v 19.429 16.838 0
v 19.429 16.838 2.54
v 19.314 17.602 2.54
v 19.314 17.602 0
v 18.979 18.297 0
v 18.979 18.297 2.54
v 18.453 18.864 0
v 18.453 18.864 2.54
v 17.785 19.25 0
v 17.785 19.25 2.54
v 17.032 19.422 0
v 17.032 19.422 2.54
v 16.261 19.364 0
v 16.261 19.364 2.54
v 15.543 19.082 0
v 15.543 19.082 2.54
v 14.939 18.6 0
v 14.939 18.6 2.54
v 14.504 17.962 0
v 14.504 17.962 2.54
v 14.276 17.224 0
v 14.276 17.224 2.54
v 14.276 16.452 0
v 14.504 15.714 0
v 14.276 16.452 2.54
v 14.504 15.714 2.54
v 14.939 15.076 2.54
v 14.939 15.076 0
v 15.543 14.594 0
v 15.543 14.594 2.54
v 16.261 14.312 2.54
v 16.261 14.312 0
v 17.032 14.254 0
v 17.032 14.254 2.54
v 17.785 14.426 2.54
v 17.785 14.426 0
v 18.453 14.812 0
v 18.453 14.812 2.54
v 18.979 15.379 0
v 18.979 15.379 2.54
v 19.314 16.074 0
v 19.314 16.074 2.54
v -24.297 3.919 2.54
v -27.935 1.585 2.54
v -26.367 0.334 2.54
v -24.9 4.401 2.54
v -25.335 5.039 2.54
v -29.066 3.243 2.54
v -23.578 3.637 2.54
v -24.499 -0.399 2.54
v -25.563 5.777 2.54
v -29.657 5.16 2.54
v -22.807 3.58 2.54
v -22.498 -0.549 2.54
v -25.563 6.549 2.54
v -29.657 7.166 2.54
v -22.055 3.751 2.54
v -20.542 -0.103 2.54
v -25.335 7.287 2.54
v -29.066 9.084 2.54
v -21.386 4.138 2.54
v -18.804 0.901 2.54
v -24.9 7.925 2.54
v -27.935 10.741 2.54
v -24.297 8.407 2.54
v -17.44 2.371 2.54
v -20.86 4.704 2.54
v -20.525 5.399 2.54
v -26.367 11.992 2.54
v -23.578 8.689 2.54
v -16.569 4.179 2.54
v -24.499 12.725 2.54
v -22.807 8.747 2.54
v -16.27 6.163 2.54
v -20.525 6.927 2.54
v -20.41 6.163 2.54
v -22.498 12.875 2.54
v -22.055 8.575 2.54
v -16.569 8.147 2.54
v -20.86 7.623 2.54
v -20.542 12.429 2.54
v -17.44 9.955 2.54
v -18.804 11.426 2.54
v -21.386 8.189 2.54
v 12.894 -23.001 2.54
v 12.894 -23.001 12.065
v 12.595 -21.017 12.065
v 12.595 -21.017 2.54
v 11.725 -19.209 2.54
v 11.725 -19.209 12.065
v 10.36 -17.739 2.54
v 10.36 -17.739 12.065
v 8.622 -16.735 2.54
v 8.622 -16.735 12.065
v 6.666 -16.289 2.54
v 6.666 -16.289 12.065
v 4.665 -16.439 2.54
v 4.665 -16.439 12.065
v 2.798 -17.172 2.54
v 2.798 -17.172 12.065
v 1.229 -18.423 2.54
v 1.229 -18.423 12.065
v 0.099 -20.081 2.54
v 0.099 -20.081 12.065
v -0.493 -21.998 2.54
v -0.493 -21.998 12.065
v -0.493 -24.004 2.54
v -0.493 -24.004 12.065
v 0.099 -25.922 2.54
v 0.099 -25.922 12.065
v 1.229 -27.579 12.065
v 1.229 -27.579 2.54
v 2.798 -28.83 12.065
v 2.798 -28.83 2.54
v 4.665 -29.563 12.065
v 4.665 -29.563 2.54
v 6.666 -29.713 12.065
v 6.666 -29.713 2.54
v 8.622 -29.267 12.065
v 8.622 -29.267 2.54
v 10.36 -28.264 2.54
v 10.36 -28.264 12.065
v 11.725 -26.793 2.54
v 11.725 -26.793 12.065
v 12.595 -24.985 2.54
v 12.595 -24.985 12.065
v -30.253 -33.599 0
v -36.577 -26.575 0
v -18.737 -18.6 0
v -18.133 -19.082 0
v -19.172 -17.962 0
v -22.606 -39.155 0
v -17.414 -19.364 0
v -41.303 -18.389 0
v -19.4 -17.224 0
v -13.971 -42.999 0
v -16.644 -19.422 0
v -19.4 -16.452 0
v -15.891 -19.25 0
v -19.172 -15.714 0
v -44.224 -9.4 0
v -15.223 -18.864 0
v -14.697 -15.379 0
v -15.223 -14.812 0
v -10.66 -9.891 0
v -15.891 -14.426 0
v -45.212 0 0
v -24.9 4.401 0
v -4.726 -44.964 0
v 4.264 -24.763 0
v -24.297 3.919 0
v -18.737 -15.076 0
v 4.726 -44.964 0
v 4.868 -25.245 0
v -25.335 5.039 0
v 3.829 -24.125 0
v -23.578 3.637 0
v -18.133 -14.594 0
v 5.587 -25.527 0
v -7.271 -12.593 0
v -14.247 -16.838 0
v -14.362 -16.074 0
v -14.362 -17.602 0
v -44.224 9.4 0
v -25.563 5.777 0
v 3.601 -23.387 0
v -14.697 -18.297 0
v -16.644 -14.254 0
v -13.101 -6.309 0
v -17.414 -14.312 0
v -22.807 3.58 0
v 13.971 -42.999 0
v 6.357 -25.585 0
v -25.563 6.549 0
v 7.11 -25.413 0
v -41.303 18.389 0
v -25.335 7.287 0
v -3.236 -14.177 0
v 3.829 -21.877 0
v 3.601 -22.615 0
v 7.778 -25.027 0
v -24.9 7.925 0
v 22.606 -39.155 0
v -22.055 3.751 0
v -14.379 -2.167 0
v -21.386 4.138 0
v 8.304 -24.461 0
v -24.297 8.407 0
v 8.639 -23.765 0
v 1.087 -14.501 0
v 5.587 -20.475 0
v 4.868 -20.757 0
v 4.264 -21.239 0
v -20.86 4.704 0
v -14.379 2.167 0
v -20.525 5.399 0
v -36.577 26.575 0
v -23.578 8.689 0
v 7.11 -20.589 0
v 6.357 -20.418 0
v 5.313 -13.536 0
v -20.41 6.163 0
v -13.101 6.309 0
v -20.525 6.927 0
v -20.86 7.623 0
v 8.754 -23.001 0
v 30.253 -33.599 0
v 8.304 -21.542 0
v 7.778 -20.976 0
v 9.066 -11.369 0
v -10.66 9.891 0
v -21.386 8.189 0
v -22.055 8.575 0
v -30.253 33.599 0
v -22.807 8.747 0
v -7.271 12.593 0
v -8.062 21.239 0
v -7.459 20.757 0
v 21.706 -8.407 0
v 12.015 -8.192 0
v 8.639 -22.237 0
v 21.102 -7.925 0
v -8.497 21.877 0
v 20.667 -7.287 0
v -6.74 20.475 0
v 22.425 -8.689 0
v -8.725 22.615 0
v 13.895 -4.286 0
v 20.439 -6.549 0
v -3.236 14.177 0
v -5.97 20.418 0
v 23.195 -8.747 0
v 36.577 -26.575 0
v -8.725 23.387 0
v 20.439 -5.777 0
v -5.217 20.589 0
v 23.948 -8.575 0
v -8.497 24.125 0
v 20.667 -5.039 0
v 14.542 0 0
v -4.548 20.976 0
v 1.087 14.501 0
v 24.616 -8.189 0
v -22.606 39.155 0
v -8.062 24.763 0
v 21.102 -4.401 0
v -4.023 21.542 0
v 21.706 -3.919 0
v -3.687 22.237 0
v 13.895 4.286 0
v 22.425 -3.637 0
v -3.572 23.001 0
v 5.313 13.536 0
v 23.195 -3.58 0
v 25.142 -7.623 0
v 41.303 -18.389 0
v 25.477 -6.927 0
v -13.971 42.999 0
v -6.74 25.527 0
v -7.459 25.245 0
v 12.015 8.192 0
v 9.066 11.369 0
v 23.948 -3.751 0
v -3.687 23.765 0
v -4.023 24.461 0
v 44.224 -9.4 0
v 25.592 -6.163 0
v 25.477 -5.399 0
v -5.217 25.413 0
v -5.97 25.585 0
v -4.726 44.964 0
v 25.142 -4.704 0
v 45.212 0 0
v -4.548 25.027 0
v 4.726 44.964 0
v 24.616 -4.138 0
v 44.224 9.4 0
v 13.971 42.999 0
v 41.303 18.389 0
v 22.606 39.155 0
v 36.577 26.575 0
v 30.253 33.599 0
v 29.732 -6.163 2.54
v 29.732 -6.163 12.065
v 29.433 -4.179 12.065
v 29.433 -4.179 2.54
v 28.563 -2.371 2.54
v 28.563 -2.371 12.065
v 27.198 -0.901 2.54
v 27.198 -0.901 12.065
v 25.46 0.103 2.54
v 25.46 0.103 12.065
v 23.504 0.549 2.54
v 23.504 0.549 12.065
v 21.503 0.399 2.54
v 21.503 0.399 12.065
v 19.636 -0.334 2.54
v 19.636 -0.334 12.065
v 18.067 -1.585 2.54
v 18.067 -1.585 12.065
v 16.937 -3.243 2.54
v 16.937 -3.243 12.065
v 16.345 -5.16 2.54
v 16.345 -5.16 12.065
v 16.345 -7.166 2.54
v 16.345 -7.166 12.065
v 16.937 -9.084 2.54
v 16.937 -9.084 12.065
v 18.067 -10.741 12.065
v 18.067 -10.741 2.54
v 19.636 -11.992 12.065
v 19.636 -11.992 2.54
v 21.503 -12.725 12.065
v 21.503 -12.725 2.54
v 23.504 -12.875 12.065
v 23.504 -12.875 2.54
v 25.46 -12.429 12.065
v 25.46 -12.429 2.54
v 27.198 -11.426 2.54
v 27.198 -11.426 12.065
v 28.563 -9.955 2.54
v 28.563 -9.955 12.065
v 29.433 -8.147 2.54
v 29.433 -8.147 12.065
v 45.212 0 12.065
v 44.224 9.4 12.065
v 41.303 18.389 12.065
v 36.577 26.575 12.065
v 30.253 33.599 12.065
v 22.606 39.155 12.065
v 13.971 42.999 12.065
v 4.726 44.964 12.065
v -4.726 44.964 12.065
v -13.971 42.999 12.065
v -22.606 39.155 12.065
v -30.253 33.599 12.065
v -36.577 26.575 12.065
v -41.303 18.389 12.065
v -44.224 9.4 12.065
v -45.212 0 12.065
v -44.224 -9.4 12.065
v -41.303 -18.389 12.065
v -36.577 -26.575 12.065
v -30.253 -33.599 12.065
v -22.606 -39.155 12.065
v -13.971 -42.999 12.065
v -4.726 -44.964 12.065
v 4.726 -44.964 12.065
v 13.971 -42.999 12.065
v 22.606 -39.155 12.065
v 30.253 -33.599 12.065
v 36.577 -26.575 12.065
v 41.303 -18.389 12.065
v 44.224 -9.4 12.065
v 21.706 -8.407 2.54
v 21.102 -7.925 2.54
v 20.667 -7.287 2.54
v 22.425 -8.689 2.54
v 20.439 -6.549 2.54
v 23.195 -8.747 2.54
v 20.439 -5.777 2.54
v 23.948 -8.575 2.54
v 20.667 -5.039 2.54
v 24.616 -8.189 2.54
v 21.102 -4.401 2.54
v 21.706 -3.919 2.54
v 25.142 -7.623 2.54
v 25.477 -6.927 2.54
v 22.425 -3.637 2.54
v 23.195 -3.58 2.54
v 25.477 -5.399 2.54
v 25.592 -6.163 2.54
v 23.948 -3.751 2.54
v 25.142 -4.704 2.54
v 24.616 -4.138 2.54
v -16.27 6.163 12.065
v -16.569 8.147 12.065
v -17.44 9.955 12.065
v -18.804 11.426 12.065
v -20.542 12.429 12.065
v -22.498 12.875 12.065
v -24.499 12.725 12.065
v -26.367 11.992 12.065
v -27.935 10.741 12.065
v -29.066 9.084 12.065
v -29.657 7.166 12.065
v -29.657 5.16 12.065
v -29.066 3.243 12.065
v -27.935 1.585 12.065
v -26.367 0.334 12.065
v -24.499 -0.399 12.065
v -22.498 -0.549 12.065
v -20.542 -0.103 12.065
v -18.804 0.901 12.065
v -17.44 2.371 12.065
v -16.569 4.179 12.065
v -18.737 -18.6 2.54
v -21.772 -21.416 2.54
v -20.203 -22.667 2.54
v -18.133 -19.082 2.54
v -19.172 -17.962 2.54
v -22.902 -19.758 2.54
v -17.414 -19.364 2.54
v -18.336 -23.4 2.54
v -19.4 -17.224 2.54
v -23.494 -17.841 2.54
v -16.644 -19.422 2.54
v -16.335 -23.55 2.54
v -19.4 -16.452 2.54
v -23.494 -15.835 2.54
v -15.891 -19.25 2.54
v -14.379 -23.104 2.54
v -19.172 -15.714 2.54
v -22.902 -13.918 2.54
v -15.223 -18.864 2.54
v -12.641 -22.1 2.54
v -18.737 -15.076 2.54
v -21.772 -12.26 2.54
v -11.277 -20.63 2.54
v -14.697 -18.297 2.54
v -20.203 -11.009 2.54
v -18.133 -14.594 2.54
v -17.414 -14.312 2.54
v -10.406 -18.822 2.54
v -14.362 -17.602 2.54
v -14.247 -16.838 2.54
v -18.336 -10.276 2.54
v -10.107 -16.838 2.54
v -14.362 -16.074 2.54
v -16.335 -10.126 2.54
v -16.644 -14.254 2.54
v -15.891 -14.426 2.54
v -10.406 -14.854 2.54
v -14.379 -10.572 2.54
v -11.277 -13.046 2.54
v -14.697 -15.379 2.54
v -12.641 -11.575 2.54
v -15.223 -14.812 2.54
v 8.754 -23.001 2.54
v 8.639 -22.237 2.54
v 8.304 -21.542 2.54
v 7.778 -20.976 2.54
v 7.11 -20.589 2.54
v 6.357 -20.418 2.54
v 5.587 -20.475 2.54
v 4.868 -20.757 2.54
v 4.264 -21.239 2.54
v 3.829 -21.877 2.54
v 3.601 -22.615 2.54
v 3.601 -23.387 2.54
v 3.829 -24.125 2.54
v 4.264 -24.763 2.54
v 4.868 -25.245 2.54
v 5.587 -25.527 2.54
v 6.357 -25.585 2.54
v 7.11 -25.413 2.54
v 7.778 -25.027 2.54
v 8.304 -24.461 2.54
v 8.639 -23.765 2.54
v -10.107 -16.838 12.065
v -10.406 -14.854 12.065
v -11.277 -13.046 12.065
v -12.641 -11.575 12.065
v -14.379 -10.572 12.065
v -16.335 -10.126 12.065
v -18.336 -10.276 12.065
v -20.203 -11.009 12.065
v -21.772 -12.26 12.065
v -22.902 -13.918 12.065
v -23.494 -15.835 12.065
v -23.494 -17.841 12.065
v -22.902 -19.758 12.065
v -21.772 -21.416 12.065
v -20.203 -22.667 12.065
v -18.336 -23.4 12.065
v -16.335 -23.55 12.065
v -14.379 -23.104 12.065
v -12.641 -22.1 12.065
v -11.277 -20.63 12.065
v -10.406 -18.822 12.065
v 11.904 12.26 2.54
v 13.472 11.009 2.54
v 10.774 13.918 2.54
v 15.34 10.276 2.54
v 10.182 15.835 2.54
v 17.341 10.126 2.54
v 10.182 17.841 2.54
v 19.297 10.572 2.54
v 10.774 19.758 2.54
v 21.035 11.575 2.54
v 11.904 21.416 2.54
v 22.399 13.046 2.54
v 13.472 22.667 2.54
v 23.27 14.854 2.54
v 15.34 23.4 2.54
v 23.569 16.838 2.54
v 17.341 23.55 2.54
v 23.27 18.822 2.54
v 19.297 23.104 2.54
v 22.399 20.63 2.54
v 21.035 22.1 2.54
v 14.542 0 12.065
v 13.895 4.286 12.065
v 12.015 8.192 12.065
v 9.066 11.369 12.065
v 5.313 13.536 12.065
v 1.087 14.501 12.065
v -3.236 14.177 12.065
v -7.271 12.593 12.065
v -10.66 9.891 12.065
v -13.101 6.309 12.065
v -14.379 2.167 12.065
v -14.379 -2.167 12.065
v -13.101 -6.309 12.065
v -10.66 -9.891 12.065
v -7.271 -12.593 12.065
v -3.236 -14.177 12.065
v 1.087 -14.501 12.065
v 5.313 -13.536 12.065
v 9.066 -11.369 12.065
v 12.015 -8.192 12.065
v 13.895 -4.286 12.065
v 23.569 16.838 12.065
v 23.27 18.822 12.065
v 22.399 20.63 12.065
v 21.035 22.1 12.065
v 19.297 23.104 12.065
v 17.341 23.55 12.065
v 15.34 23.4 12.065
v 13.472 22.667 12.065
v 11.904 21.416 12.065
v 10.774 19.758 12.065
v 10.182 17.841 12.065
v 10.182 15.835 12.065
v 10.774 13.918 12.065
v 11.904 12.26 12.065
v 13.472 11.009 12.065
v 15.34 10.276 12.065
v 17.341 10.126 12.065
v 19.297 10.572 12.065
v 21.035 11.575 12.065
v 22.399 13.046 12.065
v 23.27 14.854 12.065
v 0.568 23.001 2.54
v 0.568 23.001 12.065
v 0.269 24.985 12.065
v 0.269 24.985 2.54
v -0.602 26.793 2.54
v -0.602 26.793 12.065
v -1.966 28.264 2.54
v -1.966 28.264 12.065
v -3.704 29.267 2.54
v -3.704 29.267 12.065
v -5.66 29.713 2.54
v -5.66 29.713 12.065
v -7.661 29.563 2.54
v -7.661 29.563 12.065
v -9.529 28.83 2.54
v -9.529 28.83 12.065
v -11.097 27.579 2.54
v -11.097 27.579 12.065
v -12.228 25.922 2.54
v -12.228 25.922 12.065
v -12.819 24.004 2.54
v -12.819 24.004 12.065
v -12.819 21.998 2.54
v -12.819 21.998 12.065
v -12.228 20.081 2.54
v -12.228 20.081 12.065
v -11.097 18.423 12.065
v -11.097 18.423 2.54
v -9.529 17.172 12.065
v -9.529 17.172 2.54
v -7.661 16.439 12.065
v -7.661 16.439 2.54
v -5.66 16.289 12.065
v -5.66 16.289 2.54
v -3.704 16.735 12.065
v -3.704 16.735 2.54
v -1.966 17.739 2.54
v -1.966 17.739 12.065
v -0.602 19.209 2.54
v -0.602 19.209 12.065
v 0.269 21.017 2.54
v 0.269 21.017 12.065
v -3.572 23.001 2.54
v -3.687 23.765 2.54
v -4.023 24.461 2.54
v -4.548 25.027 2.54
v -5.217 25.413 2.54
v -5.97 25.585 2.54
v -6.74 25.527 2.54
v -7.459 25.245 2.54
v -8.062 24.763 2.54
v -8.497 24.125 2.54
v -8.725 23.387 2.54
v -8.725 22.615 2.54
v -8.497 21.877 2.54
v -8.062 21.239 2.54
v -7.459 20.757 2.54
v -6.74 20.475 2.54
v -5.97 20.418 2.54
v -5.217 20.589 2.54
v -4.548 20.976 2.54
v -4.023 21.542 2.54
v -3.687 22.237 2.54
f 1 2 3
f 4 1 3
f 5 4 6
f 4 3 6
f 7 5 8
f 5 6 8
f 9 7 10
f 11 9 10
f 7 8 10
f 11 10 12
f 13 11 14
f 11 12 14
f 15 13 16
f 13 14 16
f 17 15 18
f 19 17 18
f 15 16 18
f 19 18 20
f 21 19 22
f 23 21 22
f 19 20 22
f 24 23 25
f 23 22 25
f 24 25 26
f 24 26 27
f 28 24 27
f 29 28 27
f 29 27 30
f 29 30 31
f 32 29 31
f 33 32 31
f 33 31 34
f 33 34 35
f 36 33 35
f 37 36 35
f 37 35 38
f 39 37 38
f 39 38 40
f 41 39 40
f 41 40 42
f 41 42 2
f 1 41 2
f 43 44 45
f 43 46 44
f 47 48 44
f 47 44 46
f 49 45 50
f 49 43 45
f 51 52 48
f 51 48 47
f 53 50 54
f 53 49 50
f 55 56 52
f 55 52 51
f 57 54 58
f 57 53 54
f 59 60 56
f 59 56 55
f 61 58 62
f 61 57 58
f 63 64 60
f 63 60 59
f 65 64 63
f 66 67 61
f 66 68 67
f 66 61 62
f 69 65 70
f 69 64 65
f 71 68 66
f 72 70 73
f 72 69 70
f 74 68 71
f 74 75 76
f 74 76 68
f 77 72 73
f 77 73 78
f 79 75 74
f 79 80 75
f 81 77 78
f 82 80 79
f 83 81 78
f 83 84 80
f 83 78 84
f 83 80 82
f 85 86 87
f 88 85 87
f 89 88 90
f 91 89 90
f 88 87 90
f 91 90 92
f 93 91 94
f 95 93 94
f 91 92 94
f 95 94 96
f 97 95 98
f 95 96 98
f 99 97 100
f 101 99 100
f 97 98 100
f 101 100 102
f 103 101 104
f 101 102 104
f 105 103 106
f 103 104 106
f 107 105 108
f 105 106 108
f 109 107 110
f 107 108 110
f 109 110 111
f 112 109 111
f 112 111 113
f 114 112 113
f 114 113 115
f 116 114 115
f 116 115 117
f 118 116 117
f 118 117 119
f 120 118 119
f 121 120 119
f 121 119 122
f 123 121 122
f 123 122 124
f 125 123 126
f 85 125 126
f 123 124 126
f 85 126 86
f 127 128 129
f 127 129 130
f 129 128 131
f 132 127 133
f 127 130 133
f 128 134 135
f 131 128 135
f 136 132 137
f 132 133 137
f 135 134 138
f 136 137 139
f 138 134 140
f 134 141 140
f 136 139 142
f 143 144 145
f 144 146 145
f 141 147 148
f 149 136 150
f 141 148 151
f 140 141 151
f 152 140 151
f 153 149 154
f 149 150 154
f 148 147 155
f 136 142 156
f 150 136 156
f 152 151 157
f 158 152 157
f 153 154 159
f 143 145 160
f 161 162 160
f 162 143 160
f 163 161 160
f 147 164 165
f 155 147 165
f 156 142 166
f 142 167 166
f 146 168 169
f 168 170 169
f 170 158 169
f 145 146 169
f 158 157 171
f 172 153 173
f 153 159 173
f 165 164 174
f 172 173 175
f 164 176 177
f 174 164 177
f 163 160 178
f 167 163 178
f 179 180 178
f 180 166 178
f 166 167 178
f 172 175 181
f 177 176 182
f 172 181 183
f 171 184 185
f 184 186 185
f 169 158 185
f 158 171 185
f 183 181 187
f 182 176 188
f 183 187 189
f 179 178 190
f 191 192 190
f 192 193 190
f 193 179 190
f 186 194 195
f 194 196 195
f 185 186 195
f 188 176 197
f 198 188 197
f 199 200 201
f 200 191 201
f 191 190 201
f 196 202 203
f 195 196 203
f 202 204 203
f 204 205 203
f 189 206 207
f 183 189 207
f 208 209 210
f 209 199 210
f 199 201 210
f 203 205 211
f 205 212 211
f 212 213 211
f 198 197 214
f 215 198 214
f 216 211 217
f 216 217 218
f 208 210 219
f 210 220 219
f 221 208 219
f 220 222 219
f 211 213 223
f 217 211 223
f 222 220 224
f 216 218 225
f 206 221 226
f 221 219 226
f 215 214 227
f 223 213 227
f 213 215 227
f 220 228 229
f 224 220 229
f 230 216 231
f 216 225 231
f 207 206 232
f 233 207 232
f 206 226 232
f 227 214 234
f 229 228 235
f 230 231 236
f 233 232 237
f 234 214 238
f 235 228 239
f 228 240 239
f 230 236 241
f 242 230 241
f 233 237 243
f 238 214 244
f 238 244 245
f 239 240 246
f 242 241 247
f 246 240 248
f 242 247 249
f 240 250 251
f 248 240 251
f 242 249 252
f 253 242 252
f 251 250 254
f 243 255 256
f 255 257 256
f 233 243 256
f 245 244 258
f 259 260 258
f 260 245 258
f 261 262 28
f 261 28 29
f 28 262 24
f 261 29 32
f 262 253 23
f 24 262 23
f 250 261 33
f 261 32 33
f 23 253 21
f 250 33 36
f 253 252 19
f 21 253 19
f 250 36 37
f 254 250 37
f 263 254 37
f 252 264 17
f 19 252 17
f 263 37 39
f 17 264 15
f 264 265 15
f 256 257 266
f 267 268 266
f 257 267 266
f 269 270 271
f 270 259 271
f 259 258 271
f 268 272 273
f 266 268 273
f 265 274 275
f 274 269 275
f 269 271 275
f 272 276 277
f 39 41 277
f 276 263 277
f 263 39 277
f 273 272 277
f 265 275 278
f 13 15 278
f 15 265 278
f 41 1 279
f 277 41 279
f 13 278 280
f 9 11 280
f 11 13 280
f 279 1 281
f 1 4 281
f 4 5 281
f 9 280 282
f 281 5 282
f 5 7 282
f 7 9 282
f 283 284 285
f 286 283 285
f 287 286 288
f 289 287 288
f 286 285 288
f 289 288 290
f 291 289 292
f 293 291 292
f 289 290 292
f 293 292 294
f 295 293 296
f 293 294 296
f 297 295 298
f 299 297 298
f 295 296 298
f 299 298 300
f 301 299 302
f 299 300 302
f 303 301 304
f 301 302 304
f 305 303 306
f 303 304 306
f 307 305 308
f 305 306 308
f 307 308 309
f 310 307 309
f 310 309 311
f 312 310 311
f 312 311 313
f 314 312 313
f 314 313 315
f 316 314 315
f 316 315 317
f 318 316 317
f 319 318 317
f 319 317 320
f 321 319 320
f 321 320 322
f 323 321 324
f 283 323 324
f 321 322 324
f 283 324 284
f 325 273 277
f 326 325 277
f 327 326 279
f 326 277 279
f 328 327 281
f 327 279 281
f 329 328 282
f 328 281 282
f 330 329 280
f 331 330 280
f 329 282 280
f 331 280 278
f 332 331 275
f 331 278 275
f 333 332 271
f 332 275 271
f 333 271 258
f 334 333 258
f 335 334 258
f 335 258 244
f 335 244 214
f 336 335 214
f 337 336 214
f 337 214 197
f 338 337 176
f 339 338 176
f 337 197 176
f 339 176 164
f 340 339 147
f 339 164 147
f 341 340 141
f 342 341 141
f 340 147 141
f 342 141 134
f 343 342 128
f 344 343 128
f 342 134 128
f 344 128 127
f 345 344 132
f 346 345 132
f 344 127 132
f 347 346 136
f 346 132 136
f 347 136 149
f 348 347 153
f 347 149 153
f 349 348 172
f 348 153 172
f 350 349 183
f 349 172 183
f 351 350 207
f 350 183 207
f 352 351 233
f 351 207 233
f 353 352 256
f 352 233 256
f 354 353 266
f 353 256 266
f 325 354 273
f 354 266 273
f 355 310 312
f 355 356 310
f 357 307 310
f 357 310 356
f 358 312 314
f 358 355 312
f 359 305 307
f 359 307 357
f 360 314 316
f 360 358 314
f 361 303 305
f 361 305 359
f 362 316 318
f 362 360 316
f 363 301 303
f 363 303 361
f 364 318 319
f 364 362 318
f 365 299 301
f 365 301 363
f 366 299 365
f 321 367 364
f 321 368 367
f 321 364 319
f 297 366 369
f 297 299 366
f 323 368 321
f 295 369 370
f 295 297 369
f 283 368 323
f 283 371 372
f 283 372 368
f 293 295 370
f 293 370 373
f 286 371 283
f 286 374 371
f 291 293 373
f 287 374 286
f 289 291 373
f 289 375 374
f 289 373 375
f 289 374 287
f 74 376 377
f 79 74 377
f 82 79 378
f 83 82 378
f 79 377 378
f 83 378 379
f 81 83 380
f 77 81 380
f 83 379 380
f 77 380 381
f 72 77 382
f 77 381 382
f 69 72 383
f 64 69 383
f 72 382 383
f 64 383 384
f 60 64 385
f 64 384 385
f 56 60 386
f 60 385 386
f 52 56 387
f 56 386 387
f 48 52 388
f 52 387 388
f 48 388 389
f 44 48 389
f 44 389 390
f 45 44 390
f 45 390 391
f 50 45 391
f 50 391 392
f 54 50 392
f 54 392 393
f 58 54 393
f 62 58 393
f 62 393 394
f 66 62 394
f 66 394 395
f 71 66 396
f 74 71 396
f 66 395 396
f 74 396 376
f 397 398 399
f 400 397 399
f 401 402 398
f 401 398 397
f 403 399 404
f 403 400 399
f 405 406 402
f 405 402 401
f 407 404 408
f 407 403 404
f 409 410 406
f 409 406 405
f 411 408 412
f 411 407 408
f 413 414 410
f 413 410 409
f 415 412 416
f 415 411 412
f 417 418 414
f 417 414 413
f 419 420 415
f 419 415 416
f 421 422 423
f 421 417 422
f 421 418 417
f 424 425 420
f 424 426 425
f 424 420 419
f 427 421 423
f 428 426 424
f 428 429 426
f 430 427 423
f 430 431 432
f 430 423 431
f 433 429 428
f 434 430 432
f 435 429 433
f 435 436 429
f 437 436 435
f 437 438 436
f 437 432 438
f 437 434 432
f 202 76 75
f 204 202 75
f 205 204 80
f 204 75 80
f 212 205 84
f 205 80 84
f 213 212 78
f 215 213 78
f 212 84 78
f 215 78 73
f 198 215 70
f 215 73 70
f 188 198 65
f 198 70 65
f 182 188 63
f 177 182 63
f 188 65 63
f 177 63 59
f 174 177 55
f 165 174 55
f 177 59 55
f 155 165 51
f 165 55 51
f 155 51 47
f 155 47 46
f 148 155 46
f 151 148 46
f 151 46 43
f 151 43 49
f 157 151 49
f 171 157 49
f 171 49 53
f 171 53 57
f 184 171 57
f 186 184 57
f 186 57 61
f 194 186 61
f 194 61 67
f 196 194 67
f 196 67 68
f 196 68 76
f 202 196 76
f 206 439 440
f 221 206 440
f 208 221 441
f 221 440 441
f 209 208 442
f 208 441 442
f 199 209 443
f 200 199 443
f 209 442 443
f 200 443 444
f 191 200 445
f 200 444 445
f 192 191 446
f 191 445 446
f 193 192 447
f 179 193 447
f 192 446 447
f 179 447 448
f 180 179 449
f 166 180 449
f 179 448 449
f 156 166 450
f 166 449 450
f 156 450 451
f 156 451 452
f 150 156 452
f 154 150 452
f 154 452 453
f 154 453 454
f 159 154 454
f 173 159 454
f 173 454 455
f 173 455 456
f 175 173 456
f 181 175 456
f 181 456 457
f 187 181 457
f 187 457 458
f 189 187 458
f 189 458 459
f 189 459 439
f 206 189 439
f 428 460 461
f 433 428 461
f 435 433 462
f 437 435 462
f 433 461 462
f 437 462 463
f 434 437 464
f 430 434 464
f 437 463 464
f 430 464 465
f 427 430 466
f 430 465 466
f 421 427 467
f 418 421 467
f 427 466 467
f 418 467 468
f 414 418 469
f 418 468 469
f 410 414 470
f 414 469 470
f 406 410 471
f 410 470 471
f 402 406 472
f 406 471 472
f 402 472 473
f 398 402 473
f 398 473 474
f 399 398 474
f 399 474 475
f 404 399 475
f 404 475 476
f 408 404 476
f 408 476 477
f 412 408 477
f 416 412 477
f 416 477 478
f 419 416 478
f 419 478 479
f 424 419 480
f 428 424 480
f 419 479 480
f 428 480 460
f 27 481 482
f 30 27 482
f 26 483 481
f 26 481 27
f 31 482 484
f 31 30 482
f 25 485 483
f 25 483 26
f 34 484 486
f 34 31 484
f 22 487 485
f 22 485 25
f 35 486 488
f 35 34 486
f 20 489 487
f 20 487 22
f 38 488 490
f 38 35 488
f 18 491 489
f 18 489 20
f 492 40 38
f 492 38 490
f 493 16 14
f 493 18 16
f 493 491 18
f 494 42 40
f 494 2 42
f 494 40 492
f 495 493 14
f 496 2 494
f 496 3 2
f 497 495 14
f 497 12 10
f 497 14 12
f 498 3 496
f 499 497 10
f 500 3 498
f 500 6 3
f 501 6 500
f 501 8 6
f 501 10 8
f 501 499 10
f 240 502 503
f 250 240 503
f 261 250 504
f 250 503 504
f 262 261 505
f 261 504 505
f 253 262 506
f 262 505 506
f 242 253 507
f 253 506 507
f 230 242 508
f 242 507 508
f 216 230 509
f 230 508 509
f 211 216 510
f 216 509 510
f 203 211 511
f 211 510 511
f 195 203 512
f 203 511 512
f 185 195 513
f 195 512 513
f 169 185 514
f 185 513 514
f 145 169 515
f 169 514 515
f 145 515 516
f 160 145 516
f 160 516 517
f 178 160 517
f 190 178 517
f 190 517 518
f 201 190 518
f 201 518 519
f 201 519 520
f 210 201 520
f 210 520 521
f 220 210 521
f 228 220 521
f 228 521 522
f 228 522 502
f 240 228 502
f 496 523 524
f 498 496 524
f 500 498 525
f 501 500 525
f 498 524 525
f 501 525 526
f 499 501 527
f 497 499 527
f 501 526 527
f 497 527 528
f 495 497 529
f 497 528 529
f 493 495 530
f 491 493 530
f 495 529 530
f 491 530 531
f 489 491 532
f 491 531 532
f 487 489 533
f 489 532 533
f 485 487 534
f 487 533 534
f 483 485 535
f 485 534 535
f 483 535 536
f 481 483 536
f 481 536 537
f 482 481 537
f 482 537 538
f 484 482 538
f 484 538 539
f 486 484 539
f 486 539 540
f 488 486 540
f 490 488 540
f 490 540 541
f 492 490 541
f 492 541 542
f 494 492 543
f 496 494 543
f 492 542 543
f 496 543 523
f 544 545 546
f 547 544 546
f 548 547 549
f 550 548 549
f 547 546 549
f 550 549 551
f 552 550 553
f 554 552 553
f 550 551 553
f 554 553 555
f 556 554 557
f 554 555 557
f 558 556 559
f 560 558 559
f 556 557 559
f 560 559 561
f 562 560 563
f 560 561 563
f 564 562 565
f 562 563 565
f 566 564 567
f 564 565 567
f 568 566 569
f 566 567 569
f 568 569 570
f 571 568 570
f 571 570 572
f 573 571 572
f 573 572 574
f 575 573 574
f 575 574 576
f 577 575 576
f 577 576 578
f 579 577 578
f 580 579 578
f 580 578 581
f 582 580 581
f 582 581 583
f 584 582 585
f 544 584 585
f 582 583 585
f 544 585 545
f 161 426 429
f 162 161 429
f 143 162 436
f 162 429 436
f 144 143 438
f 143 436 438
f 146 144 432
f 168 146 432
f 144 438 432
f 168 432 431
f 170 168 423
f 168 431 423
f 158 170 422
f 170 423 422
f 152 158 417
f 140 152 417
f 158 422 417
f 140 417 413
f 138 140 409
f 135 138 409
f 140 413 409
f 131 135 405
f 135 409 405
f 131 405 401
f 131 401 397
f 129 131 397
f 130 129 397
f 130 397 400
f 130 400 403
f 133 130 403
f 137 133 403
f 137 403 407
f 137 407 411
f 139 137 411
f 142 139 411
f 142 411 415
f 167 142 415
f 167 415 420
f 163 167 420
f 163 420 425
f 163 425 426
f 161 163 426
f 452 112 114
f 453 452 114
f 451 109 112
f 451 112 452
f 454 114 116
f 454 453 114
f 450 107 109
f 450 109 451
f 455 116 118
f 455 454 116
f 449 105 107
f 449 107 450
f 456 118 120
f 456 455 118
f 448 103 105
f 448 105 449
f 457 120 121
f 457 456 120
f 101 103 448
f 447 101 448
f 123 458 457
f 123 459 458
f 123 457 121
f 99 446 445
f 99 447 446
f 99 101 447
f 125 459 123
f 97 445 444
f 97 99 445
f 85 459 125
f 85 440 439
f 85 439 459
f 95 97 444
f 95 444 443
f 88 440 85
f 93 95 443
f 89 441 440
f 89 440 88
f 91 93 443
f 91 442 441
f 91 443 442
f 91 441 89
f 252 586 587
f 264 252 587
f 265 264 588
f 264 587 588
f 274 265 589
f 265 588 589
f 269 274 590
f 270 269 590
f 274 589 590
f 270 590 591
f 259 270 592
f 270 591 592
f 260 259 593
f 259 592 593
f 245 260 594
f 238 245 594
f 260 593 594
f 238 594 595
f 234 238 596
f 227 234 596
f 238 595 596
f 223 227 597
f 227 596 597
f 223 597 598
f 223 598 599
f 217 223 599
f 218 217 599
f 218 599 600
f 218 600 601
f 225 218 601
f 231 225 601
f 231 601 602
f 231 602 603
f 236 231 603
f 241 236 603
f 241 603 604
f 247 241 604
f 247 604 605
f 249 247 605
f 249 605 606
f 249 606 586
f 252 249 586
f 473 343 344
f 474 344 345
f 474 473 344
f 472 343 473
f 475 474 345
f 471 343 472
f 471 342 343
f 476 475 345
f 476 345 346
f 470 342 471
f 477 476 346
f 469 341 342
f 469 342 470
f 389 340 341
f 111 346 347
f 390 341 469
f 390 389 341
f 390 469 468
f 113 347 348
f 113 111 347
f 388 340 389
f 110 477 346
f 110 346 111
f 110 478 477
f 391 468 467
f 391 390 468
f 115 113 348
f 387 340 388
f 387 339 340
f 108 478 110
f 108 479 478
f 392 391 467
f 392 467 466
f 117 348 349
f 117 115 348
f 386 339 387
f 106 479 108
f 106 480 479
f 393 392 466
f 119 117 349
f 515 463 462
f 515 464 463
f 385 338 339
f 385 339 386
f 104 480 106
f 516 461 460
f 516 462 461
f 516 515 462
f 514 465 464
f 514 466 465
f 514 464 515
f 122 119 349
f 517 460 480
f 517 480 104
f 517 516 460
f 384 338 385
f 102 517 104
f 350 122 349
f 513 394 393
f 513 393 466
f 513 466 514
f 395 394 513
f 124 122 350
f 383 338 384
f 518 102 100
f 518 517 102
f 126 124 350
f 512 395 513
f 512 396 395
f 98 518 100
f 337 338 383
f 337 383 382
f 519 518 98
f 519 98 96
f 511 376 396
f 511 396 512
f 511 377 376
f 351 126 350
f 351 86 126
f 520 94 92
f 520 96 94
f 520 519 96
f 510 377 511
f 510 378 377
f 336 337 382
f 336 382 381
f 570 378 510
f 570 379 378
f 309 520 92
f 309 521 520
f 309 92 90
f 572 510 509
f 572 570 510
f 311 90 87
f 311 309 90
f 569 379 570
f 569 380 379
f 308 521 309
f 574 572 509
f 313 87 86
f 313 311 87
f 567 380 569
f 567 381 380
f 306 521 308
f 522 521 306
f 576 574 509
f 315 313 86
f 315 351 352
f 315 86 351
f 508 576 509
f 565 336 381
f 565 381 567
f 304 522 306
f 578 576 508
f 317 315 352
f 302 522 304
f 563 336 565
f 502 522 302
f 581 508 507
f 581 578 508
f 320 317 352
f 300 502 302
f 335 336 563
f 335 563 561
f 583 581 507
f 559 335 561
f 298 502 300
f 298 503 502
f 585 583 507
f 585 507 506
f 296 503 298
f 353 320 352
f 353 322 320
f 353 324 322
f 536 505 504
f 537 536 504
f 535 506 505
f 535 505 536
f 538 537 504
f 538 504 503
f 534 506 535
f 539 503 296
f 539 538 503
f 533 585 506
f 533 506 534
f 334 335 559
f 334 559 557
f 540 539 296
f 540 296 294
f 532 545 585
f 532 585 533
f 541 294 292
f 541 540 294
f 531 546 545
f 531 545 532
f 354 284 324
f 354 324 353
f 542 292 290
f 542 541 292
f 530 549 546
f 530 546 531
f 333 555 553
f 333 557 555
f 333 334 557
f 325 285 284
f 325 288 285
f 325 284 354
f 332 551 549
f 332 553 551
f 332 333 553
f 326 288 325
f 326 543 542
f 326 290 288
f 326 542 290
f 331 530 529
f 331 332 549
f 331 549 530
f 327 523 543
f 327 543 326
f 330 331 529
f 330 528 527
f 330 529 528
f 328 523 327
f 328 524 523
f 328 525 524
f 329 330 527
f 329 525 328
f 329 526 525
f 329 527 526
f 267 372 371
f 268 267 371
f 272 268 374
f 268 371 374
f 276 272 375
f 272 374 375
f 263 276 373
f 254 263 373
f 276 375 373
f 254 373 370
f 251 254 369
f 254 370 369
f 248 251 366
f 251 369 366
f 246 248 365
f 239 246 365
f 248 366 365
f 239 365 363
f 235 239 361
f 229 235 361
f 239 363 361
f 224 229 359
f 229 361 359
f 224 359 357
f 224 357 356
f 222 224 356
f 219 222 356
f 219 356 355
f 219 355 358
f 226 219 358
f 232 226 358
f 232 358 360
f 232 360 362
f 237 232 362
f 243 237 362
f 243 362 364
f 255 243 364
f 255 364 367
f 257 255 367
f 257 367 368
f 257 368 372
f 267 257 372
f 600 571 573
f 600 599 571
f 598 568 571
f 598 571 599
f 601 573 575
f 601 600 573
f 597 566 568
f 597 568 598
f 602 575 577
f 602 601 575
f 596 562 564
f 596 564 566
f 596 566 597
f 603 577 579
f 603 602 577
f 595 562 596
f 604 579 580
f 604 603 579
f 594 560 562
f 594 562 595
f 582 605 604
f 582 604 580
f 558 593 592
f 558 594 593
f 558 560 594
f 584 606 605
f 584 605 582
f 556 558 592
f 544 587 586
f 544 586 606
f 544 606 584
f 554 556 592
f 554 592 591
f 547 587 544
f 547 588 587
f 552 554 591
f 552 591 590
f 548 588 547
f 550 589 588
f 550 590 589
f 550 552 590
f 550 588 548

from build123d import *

# Parameters (mm, degrees)
F0_R     = 45.212
F1_DEPTH = 12.065
F2_R     = 2.5908
F3_DEPTH = 25.4
F4_R     = 14.5415
F5_DEPTH = 25.4
F6_R     = 6.731
F7_DEPTH = 9.525


with BuildPart() as f1:
    # F0 (on Top) → F1 (new body)
    with BuildSketch(Plane.XY):
        Circle(F0_R)
    extrude(amount=F1_DEPTH)

    # F2 (on face) → F3 (cut)
    with BuildSketch(Plane.XY.offset(12.065)):
        with Locations((-6.163129, 23.001109)):
            Circle(F2_R)
        with Locations((-23.001109, 6.163129)):
            Circle(F2_R)
        with Locations((-16.83798, -16.83798)):
            Circle(F2_R)
        with Locations((6.163129, -23.001109)):
            Circle(F2_R)
        with Locations((23.001109, -6.163129)):
            Circle(F2_R)
        with Locations((16.83798, 16.83798)):
            Circle(F2_R)
    extrude(amount=-F3_DEPTH, mode=Mode.SUBTRACT)

    # F4 (on face) → F5 (cut)
    with BuildSketch(Plane.XY.offset(12.065)):
        Circle(F4_R)
    extrude(amount=-F5_DEPTH, mode=Mode.SUBTRACT)

    # F6 (on face) → F7 (cut)
    with BuildSketch(Plane.XY.offset(12.065)):
        with Locations((-6.163129, 23.001109)):
            Circle(F6_R)
        with Locations((16.83798, 16.83798)):
            Circle(F6_R)
        with Locations((23.001109, -6.163129)):
            Circle(F6_R)
        with Locations((6.163129, -23.001109)):
            Circle(F6_R)
        with Locations((-16.83798, -16.83798)):
            Circle(F6_R)
        with Locations((-23.001109, 6.163129)):
            Circle(F6_R)
    extrude(amount=-F7_DEPTH, mode=Mode.SUBTRACT)


solid = f1.part
